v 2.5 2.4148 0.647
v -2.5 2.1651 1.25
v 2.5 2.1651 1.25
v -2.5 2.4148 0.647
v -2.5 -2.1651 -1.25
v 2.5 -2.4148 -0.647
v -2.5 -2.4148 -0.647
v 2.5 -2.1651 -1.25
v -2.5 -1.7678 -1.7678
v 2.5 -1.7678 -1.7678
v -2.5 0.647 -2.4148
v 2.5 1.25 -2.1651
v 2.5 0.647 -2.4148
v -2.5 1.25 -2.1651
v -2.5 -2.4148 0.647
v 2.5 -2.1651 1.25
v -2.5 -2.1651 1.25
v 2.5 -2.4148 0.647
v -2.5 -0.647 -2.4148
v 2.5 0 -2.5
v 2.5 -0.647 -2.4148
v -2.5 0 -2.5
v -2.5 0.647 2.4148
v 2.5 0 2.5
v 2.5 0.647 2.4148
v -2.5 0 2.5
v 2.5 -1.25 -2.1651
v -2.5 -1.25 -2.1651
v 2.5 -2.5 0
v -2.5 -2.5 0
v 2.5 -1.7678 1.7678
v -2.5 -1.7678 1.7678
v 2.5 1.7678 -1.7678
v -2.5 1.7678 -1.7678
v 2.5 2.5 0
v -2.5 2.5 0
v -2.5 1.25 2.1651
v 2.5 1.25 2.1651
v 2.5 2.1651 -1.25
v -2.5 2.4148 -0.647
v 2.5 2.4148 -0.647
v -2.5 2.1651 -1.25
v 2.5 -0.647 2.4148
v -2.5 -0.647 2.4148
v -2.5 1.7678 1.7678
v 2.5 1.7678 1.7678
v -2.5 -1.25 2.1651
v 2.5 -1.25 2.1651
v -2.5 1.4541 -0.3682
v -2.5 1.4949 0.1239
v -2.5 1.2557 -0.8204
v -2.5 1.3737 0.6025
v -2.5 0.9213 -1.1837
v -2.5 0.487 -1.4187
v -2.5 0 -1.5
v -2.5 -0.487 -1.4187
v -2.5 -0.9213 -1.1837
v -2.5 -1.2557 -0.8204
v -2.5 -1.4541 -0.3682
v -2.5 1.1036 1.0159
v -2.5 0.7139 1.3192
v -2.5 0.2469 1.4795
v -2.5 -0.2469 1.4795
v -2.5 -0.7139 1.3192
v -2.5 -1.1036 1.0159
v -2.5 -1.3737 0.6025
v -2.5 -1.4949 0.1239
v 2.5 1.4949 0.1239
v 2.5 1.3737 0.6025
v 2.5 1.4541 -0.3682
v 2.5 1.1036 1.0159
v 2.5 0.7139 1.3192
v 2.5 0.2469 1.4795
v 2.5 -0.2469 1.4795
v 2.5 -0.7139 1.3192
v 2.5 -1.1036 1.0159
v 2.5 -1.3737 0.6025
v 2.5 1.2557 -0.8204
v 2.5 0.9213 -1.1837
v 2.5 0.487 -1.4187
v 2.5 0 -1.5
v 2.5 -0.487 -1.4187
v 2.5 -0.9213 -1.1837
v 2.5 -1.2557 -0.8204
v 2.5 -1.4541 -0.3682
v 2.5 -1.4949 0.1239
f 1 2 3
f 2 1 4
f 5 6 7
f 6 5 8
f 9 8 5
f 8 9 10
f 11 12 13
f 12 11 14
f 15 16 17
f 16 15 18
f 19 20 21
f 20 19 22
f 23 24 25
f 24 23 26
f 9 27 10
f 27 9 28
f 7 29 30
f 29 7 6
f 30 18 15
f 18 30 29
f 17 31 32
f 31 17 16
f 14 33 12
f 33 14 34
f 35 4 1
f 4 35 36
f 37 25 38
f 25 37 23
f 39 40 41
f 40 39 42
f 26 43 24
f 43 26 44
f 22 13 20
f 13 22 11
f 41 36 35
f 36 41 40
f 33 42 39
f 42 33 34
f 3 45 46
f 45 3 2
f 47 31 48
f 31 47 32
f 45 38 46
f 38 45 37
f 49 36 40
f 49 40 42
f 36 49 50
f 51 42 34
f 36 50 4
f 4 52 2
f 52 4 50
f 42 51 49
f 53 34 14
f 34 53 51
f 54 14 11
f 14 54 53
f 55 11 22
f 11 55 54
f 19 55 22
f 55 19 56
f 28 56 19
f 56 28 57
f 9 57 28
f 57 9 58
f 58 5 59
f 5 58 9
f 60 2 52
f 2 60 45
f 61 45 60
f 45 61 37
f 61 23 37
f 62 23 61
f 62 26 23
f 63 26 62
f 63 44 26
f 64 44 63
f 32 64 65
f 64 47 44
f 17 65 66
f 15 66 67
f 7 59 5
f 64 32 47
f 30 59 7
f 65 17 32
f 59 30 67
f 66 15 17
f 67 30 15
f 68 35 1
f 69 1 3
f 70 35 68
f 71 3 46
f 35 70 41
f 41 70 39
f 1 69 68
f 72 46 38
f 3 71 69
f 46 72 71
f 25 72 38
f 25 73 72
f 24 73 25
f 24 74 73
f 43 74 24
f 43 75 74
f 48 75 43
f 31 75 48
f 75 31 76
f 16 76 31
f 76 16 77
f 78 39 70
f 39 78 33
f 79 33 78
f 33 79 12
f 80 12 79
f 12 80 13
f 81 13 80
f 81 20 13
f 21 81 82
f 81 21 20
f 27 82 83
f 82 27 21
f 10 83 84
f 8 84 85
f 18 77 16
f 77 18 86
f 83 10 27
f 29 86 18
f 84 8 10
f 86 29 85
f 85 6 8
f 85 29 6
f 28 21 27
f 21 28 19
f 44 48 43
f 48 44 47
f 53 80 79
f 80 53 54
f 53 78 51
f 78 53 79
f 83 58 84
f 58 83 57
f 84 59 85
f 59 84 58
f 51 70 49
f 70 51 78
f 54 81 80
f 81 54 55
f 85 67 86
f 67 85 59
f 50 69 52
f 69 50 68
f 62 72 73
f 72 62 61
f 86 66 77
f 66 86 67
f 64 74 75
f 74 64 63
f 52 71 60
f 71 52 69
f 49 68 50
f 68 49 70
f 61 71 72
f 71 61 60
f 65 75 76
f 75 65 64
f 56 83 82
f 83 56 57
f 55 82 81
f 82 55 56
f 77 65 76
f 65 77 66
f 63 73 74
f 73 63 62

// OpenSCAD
difference() {
	rotate(a = [0, 90, 0]) {
		translate(v = [0, 0, -2.5]) {
			cylinder($fn = 24, h = 5, r1 = 2.5, r2 = 2.5);
		}
	}
	rotate(a = [0, 90, 0]) {
		translate(v = [0, 0, -3.0]) {
			cylinder($fn = 19, h = 6, r1 = 1.5, r2 = 1.5);
		}
	}
}
